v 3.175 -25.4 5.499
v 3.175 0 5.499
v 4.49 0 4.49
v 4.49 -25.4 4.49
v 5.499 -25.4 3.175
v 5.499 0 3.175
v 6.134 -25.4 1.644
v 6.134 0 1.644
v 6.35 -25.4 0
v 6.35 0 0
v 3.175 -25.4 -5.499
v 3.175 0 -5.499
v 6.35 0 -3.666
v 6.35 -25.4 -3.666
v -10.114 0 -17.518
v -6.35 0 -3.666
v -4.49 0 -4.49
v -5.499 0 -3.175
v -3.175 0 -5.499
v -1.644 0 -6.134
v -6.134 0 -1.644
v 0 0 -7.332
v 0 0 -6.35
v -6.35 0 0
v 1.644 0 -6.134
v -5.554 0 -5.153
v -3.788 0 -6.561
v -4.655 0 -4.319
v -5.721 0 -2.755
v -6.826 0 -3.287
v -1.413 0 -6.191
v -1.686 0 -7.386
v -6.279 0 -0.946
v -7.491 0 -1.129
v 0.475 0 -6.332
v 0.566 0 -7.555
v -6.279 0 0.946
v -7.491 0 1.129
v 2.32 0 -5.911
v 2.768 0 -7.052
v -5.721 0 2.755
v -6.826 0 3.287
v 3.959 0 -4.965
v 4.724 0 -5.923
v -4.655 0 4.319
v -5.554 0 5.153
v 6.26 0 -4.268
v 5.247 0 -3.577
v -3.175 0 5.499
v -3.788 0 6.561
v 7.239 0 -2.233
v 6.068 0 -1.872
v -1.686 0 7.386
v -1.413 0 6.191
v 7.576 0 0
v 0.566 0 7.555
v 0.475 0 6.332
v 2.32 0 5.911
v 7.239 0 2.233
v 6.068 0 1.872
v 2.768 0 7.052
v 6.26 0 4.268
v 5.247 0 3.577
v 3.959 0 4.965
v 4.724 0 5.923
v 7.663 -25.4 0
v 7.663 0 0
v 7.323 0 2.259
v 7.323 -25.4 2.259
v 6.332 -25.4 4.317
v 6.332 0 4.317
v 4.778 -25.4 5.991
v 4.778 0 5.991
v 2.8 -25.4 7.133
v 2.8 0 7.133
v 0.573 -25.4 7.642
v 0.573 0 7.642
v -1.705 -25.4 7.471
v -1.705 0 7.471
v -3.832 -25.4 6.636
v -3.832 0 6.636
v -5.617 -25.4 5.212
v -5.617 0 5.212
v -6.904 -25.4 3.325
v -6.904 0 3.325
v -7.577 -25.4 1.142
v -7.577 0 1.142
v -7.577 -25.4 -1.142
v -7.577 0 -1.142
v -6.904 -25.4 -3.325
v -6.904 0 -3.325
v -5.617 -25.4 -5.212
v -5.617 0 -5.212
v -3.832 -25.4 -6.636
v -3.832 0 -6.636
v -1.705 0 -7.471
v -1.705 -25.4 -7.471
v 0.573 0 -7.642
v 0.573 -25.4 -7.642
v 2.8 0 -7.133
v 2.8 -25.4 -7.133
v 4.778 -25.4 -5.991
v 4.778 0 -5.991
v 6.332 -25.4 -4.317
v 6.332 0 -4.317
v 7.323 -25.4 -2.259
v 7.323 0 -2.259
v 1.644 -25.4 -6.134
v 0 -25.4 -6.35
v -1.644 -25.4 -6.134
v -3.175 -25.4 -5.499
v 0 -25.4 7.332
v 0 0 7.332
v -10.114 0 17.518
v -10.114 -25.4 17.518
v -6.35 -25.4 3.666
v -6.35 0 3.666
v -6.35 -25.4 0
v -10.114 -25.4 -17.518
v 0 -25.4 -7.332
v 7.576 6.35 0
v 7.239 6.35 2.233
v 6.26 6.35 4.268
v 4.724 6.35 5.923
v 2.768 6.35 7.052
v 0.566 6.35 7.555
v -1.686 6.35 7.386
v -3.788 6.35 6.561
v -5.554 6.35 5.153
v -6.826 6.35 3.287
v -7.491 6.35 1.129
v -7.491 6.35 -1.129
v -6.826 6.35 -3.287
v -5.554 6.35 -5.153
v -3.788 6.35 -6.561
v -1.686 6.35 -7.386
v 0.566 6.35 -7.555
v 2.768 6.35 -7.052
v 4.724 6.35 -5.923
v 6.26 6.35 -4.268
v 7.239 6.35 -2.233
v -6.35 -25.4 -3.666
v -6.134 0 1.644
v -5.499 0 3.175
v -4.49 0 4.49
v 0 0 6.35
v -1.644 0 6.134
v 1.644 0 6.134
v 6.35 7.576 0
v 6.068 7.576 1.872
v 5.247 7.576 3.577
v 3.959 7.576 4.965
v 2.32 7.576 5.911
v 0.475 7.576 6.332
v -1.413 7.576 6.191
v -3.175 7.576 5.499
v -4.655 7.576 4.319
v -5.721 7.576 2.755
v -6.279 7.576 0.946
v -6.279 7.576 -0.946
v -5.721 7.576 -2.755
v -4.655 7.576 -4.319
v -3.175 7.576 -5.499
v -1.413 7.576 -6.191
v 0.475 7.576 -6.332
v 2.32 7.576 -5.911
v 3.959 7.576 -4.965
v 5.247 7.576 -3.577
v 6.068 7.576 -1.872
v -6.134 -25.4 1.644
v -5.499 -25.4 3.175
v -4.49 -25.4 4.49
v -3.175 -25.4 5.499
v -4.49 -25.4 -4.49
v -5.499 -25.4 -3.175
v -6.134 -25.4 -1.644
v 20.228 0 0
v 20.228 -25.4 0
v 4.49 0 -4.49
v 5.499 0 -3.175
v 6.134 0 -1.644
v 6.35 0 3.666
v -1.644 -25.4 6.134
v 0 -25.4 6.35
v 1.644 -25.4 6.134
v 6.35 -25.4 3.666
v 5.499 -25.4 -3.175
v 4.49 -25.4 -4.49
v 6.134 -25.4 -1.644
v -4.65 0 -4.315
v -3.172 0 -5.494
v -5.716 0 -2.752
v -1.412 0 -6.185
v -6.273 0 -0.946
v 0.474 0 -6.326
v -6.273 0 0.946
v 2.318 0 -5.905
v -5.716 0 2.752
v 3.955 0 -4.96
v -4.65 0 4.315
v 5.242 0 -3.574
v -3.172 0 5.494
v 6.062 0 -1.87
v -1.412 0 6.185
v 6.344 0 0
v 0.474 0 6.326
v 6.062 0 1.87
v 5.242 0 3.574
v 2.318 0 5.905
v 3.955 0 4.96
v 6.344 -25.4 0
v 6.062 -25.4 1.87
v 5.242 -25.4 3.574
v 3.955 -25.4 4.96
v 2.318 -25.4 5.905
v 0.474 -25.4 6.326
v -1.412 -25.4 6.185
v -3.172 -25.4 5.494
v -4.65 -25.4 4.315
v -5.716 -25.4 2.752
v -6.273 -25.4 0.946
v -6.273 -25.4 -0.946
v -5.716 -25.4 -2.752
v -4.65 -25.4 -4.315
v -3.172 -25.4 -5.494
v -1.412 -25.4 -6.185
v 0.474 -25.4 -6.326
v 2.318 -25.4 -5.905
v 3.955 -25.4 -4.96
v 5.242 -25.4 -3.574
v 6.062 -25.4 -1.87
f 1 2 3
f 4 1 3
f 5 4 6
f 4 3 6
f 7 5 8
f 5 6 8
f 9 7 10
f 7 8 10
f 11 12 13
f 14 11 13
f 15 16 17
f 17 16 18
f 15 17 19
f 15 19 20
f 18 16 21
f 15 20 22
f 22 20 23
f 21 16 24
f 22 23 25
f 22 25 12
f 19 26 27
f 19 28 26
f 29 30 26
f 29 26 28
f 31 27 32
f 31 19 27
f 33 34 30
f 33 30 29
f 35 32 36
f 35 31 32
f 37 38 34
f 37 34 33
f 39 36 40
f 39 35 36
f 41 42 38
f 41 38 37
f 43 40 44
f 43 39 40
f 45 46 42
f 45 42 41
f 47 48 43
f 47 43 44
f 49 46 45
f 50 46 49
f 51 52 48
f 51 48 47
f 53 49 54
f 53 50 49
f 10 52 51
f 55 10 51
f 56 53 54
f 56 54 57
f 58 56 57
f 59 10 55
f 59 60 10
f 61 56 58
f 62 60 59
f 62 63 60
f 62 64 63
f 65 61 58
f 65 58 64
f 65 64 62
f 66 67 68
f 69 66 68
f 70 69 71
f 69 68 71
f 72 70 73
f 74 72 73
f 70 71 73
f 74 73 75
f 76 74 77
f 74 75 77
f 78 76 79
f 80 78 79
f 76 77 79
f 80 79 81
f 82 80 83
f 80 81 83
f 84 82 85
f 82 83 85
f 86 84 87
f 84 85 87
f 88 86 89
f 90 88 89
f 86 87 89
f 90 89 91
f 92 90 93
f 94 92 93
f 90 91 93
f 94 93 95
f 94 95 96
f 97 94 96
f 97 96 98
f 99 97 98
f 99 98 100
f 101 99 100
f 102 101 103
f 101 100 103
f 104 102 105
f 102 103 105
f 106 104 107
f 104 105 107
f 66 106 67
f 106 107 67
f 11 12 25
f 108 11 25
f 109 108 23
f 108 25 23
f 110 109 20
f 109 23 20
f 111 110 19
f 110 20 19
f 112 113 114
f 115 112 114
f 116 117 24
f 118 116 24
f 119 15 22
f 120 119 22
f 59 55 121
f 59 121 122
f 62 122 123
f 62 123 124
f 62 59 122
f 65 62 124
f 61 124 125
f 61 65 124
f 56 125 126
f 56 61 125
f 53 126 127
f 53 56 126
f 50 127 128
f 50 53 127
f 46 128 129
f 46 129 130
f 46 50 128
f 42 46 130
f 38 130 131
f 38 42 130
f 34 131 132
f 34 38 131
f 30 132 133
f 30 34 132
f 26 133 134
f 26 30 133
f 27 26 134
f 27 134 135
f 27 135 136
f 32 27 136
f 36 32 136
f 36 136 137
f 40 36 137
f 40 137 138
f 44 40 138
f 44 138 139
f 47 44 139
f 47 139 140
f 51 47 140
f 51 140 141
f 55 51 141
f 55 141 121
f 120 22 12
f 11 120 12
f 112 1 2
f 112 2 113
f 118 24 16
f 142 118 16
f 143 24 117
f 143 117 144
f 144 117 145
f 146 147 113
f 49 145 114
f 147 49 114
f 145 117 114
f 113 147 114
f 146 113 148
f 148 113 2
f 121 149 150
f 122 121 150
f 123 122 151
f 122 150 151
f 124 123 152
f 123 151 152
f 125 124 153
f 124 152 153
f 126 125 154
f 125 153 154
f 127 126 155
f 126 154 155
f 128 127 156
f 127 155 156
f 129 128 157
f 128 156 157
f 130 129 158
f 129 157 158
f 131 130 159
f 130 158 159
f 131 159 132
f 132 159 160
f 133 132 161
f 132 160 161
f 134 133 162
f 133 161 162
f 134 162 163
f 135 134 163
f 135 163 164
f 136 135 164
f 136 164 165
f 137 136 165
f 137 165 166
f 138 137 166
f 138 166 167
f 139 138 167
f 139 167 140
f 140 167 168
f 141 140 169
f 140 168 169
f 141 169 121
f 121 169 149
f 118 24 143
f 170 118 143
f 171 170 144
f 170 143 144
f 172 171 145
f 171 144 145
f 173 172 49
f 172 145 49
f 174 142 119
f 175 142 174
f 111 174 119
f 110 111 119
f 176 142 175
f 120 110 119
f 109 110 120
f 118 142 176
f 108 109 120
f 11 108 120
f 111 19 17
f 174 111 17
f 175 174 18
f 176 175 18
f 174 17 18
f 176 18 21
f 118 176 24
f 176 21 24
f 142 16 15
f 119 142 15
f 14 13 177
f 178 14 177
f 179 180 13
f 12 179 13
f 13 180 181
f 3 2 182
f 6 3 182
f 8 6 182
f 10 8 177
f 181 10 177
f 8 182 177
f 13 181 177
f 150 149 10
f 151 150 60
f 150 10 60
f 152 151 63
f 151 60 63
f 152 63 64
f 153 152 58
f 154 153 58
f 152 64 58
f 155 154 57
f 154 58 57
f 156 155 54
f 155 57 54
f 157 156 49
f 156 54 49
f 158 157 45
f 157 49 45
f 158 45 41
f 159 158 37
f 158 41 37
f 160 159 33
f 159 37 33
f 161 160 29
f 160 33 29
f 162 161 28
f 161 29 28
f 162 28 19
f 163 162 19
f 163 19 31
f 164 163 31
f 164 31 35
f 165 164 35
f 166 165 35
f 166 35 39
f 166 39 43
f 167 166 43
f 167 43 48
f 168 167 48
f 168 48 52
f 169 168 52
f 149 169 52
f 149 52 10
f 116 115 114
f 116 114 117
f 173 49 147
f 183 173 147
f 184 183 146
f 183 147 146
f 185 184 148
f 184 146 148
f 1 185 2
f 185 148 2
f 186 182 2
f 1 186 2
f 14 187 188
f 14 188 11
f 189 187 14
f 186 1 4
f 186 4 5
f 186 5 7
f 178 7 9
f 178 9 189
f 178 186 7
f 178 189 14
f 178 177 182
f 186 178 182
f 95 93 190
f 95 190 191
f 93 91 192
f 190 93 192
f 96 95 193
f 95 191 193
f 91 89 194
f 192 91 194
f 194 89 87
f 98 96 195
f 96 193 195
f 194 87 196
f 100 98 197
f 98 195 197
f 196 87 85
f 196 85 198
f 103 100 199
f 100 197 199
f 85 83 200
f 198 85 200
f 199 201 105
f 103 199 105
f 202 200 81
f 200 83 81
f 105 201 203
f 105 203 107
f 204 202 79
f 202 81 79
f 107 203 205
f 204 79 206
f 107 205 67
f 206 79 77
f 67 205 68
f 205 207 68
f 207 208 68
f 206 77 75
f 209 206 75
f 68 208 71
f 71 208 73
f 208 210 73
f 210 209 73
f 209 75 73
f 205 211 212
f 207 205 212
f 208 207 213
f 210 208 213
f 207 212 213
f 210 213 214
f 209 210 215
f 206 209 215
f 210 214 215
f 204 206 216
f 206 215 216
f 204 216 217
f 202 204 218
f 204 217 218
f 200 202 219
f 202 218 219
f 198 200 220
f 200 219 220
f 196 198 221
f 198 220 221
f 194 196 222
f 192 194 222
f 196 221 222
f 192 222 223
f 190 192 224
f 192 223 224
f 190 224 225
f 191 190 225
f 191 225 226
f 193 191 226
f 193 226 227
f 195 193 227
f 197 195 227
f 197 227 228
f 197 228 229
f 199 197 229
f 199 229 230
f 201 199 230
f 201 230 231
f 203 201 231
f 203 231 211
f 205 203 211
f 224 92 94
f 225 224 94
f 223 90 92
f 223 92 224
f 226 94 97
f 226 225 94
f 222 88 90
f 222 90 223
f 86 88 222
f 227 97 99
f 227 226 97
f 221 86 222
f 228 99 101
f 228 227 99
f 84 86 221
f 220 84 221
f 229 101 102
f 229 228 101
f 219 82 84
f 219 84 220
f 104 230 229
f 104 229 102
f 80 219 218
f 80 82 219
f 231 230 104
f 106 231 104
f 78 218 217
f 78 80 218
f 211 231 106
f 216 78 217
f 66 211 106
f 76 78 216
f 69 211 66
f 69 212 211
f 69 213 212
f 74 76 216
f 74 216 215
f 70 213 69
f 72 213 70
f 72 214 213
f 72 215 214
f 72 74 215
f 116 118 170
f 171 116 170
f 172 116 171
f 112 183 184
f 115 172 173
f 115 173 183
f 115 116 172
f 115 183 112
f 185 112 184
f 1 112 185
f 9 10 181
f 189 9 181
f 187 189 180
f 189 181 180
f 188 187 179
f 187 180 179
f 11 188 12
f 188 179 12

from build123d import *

# Parameters (mm, degrees)
F1_DEPTH = 25.4
F2_R     = 7.6630831302
F3_DEPTH = 25.4
F4_R     = 7.5760558817
F4_R_2   = 6.35
F5_DEPTH = 8.89
F7_R     = 6.3438436569
F8_DEPTH = 32.9770558817


# Not quite as in the source:
# - a fillet or chamfer that OpenCascade refuses, or shapes differently, is made with other operations: its cross-section is extruded or revolved along the edge and cut away or added


with BuildPart() as f1:
    # F0 (on Front) → F1 (new body)
    with BuildSketch(Plane.XZ):
        Polygon((-6.35, 3.6661742094), (-3.1749998817, 5.4992613823), (0, 7.3323484187), (-10.1139404636, 17.5178587477), align=None)
        with BuildLine():
            ThreePointArc((-6.35, 0), (-5.4992612799, 3.1750000591), (-3.1749998817, 5.4992613823))
            Line((-3.1749998817, 5.4992613823), (-6.35, 3.6661742094))
            Line((-6.35, 3.6661742094), (-6.35, 0))
        make_face()
        with BuildLine():
            ThreePointArc((-3.1749998817, 5.4992613823), (8.7e-08, 6.35), (3.1750000324, 5.4992612953))
            Line((3.1750000324, 5.4992612953), (0, 7.3323484187))
            Line((0, 7.3323484187), (-3.1749998817, 5.4992613823))
        make_face()
    extrude(amount=F1_DEPTH)


with BuildPart() as f1b:
    # F0 (on Front) → F1, piece 2 (new body)
    with BuildSketch(Plane.XZ):
        Polygon((6.35, 3.6661742094), (6.35, 0), (6.35, -3.6661742094), (20.2278809273, 0), align=None)
        with BuildLine():
            ThreePointArc((3.1750000324, 5.4992612953), (5.4992613234, 3.1749999838), (6.35, 0))
            Line((6.35, 0), (6.35, 3.6661742094))
            Line((6.35, 3.6661742094), (3.1750000324, 5.4992612953))
        make_face()
        with BuildLine():
            Line((6.35, -3.6661742094), (6.35, 0))
            ThreePointArc((6.35, 0), (5.4992612955, -3.175000032), (3.174999936, -5.499261351))
            Line((3.174999936, -5.499261351), (6.35, -3.6661742094))
        make_face()
    extrude(amount=F1_DEPTH)


with BuildPart() as f1c:
    # F0 (on Front) → F1, piece 3 (new body)
    with BuildSketch(Plane.XZ):
        Polygon((0, -7.3323484187), (-3.1749999956, -5.4992613166), (-6.35, -3.6661742094), (-10.1139404636, -17.5178587477), align=None)
        with BuildLine():
            Line((-6.35, -3.6661742094), (-3.1749999956, -5.4992613166))
            ThreePointArc((-3.1749999956, -5.4992613166), (-5.4992613128, -3.1750000022), (-6.35, 0))
            Line((-6.35, 0), (-6.35, -3.6661742094))
        make_face()
        with BuildLine():
            Line((0, -7.3323484187), (3.174999936, -5.499261351))
            ThreePointArc((3.174999936, -5.499261351), (-3.44e-08, -6.35), (-3.1749999956, -5.4992613166))
            Line((-3.1749999956, -5.4992613166), (0, -7.3323484187))
        make_face()
    extrude(amount=F1_DEPTH)


with BuildPart() as f3:
    # F2 (on Front) → F3 (new body)
    with BuildSketch(Plane.XZ):
        Circle(F2_R)
    extrude(amount=F3_DEPTH)

    # F7 (on face) → F8 (cut, through all)
    with BuildSketch(Plane.XZ.offset(25.4)):
        Circle(F7_R)
    extrude(amount=-F8_DEPTH, mode=Mode.SUBTRACT)


with BuildPart() as f5:
    # F4 (on Front) → F5 (new body)
    with BuildSketch(Plane.XZ):
        Circle(F4_R)
        Circle(F4_R_2, mode=Mode.SUBTRACT)
    extrude(amount=-F5_DEPTH)

    # F6: chamfer of 2.54 on 1 edges, made by hand

    # F6_s1 → F6_t2 (revolve, cut)
    with BuildSketch(Plane.XY):
        Polygon((7.5760558817, 6.35), (5.0360558817, 8.89), (7.5760558817, 8.89), align=None)
    revolve(axis=Axis((0, 8.89, 0), (0, -1, 0)), mode=Mode.SUBTRACT)


solid = Compound([f1.part, f1b.part, f1c.part, f3.part, f5.part])
